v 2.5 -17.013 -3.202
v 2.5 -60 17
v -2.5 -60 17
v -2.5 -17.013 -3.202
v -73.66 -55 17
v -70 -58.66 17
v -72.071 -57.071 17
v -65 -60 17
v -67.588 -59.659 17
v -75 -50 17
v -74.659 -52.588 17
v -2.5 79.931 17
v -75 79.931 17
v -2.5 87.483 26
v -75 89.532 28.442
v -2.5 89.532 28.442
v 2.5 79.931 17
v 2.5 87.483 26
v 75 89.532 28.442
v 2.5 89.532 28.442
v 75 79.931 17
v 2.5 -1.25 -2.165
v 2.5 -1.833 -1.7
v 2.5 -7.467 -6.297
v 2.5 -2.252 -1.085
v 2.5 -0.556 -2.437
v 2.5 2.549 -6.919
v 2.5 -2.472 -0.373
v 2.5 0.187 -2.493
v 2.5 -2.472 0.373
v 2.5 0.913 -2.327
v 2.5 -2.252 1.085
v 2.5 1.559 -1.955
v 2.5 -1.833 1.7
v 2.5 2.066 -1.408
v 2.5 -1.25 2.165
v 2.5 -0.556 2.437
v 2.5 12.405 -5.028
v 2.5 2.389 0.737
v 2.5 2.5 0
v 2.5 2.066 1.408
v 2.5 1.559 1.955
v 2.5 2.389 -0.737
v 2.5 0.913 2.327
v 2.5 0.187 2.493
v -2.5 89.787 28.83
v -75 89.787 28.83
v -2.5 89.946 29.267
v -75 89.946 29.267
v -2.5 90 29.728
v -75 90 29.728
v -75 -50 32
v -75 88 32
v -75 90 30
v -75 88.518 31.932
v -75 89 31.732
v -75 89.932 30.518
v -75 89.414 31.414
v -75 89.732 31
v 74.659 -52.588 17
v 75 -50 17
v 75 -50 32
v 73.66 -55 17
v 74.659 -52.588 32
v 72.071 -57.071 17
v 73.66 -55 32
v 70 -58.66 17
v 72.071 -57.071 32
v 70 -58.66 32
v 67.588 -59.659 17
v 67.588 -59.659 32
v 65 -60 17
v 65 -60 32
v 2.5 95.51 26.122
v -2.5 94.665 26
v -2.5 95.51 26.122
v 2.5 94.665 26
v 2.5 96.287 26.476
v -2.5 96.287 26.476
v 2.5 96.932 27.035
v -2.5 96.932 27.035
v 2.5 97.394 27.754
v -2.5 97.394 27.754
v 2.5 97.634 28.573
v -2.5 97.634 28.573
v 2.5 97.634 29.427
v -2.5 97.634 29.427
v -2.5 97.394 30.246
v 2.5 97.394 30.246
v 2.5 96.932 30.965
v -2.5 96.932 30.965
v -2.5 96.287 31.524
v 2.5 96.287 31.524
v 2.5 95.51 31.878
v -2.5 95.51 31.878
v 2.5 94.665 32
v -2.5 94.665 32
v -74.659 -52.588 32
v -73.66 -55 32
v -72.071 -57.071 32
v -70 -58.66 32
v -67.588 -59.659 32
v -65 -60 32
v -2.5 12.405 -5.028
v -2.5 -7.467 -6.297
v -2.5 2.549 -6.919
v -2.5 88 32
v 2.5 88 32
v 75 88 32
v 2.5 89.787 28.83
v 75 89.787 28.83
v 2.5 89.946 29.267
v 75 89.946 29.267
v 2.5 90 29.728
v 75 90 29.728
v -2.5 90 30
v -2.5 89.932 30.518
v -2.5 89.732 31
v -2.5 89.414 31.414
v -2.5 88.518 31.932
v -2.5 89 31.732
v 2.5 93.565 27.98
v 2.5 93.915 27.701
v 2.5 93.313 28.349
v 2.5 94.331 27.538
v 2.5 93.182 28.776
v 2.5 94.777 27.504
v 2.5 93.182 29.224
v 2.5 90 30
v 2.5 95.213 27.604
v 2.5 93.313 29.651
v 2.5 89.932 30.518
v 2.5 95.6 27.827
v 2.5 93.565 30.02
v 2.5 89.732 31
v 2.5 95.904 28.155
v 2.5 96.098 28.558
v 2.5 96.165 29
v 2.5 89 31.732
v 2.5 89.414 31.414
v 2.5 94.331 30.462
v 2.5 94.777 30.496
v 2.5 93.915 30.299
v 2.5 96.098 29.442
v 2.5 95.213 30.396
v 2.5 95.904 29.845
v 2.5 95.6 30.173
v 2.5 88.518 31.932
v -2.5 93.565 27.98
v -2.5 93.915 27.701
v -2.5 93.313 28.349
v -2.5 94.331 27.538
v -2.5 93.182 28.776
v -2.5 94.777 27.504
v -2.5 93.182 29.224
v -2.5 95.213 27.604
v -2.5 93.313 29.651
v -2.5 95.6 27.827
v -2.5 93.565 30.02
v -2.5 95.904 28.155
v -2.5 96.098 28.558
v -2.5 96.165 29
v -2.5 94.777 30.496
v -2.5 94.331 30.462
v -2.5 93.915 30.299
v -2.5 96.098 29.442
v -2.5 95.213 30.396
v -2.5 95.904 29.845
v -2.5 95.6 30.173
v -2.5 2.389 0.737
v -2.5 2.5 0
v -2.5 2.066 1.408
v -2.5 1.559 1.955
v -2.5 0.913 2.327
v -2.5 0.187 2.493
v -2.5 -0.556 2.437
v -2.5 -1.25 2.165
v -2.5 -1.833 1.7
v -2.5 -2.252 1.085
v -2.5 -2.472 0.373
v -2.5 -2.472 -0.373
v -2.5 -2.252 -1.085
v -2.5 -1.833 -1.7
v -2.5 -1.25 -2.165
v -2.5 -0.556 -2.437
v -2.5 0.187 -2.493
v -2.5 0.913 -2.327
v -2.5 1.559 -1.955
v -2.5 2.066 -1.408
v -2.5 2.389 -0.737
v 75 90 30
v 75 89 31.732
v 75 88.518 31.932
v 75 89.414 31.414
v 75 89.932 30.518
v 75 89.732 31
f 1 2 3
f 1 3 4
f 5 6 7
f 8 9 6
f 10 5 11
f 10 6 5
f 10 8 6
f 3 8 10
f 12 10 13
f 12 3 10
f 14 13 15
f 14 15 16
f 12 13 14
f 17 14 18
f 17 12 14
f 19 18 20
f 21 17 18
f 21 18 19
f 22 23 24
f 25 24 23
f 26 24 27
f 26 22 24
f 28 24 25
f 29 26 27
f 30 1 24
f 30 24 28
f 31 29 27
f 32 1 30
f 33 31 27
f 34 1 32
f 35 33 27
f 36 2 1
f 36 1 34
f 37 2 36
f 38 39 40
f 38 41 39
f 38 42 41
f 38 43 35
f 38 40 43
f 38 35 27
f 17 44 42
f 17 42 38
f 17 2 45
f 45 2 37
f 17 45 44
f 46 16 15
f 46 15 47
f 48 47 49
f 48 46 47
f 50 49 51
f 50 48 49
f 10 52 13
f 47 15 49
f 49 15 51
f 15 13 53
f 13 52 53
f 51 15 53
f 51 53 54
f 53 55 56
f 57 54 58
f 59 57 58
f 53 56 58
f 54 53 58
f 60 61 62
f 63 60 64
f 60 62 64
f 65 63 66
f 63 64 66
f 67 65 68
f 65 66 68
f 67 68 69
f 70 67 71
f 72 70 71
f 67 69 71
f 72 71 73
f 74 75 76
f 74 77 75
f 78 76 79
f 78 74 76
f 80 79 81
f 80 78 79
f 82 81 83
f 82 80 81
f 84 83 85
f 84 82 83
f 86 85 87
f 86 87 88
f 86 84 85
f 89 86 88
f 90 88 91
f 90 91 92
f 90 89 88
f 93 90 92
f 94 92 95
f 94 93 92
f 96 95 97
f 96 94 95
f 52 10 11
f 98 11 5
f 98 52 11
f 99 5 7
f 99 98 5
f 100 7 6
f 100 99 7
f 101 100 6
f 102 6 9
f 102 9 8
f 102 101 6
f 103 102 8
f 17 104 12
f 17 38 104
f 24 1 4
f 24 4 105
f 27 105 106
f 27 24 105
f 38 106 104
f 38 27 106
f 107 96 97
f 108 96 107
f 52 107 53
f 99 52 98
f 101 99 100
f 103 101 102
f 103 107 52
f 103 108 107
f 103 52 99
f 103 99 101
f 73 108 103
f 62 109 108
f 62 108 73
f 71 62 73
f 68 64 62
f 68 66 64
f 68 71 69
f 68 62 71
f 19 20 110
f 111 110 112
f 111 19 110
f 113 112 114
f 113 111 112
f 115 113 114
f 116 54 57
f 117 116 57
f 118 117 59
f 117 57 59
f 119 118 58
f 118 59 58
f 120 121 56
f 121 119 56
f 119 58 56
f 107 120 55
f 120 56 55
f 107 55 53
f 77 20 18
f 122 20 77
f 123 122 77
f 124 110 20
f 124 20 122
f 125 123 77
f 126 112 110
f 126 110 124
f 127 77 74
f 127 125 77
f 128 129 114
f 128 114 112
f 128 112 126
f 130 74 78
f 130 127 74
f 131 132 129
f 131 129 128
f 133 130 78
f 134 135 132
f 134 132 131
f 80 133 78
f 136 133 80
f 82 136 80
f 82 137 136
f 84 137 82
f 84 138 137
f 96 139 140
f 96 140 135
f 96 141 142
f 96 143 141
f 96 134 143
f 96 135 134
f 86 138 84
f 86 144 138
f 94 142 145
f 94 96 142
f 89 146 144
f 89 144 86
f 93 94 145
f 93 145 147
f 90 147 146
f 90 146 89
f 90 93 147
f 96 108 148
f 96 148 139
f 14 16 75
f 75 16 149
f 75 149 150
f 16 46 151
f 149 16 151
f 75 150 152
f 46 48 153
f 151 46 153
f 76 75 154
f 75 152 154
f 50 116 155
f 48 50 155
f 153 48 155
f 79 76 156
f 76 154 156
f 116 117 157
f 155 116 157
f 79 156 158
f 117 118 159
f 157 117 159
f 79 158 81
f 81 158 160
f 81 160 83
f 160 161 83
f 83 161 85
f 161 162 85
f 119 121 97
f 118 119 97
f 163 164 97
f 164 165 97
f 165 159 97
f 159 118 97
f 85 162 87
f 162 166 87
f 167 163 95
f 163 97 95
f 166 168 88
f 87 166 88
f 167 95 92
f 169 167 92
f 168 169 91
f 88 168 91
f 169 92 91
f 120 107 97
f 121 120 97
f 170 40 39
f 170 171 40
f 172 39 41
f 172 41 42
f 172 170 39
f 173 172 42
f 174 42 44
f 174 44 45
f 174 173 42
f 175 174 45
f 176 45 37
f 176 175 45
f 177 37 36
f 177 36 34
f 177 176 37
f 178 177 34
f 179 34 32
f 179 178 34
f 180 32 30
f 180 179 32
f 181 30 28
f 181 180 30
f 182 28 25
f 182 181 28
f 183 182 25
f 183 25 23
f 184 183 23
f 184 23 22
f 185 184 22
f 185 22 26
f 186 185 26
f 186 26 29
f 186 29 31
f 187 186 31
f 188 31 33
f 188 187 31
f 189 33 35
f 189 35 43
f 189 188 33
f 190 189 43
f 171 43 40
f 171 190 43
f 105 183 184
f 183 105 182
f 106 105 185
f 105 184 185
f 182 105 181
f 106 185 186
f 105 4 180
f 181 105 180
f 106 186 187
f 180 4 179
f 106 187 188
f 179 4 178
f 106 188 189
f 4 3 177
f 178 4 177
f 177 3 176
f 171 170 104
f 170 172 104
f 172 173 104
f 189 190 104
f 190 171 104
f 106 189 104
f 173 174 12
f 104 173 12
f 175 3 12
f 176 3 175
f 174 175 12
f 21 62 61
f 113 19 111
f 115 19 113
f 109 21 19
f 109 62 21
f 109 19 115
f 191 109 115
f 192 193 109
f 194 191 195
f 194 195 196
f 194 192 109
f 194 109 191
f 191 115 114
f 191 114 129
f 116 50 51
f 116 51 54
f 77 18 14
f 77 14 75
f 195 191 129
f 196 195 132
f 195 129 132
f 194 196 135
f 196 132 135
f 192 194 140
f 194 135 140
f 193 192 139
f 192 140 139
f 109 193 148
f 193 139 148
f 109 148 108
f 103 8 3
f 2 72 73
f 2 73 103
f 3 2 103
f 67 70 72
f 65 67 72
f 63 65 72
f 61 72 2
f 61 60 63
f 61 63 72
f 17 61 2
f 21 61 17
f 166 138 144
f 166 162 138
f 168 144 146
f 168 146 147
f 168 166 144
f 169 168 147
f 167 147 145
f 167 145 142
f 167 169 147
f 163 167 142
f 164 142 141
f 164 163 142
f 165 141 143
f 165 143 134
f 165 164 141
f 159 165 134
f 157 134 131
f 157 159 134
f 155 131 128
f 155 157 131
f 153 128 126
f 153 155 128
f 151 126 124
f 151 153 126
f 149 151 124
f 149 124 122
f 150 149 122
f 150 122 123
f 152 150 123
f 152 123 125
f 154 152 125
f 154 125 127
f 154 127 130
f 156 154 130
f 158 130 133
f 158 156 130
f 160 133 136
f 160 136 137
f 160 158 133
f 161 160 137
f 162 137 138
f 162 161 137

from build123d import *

# Parameters (mm, degrees)
F0_W     = 150
F0_H     = 15
F1_DEPTH = 75
F2_SIZE2 = 10.0691955741
F2_SIZE  = 12
F3_R     = 2
F4_R     = 2.5
F5_DEPTH = 2.5
F6_R     = 1.5
F7_DEPTH = 2.5
F8_R     = 10


with BuildPart() as f1:
    # F0 (on Right) → F1 (new body, symmetric)
    with BuildSketch(Plane.YZ):
        with Locations((15, 24.5)):
            Rectangle(F0_W, F0_H)
    extrude(amount=F1_DEPTH, both=True)

    # F2
    f2_edges = [f1.edges().sort_by_distance(p)[0] for p in [
        (0, 90, 17),
    ]]
    f2_side = f1.faces().sort_by_distance((0, 90, 24.5))[0]
    chamfer(f2_edges, length=F2_SIZE, length2=F2_SIZE2, reference=f2_side)

    # F3
    f3_edges = [f1.edges().sort_by_distance(p)[0] for p in [
        (0, 90, 32),
        (0, 90, 29),
    ]]
    fillet(f3_edges, radius=F3_R)

    # F4 (on Right) → F5 (join, symmetric)
    with BuildSketch(Plane.YZ):
        with BuildLine():
            Line((79.9308044259, 17), (-60, 17))
            Line((-60, 17), (-17.0128849215, -3.2016815445))
            ThreePointArc((-17.0128849215, -3.2016815445), (-2.4781851934, -6.9231586695), (12.4051748829, -5.0277745355))
            Line((12.4051748829, -5.0277745355), (79.9308044259, 17))
        make_face()
        Circle(F4_R, mode=Mode.SUBTRACT)
    extrude(amount=F5_DEPTH, both=True)

    # F6 (on Right) → F7 (join, symmetric)
    with BuildSketch(Plane.YZ):
        with BuildLine():
            Line((94.6649461985, 32), (84.0871334076, 32))
            Line((84.0871334076, 32), (84.0871334076, 26))
            Line((84.0871334076, 26), (94.6649461985, 26))
            ThreePointArc((94.6649461985, 26), (97.6649461985, 29), (94.6649461985, 32))
        make_face()
        with Locations((94.6649461985, 29)):
            Circle(F6_R, mode=Mode.SUBTRACT)
    extrude(amount=F7_DEPTH, both=True)

    # F8
    f8_edges = [f1.edges().sort_by_distance(p)[0] for p in [
        (75, -60, 24.5),
        (-75, -60, 24.5),
    ]]
    fillet(f8_edges, radius=F8_R)


solid = f1.part
